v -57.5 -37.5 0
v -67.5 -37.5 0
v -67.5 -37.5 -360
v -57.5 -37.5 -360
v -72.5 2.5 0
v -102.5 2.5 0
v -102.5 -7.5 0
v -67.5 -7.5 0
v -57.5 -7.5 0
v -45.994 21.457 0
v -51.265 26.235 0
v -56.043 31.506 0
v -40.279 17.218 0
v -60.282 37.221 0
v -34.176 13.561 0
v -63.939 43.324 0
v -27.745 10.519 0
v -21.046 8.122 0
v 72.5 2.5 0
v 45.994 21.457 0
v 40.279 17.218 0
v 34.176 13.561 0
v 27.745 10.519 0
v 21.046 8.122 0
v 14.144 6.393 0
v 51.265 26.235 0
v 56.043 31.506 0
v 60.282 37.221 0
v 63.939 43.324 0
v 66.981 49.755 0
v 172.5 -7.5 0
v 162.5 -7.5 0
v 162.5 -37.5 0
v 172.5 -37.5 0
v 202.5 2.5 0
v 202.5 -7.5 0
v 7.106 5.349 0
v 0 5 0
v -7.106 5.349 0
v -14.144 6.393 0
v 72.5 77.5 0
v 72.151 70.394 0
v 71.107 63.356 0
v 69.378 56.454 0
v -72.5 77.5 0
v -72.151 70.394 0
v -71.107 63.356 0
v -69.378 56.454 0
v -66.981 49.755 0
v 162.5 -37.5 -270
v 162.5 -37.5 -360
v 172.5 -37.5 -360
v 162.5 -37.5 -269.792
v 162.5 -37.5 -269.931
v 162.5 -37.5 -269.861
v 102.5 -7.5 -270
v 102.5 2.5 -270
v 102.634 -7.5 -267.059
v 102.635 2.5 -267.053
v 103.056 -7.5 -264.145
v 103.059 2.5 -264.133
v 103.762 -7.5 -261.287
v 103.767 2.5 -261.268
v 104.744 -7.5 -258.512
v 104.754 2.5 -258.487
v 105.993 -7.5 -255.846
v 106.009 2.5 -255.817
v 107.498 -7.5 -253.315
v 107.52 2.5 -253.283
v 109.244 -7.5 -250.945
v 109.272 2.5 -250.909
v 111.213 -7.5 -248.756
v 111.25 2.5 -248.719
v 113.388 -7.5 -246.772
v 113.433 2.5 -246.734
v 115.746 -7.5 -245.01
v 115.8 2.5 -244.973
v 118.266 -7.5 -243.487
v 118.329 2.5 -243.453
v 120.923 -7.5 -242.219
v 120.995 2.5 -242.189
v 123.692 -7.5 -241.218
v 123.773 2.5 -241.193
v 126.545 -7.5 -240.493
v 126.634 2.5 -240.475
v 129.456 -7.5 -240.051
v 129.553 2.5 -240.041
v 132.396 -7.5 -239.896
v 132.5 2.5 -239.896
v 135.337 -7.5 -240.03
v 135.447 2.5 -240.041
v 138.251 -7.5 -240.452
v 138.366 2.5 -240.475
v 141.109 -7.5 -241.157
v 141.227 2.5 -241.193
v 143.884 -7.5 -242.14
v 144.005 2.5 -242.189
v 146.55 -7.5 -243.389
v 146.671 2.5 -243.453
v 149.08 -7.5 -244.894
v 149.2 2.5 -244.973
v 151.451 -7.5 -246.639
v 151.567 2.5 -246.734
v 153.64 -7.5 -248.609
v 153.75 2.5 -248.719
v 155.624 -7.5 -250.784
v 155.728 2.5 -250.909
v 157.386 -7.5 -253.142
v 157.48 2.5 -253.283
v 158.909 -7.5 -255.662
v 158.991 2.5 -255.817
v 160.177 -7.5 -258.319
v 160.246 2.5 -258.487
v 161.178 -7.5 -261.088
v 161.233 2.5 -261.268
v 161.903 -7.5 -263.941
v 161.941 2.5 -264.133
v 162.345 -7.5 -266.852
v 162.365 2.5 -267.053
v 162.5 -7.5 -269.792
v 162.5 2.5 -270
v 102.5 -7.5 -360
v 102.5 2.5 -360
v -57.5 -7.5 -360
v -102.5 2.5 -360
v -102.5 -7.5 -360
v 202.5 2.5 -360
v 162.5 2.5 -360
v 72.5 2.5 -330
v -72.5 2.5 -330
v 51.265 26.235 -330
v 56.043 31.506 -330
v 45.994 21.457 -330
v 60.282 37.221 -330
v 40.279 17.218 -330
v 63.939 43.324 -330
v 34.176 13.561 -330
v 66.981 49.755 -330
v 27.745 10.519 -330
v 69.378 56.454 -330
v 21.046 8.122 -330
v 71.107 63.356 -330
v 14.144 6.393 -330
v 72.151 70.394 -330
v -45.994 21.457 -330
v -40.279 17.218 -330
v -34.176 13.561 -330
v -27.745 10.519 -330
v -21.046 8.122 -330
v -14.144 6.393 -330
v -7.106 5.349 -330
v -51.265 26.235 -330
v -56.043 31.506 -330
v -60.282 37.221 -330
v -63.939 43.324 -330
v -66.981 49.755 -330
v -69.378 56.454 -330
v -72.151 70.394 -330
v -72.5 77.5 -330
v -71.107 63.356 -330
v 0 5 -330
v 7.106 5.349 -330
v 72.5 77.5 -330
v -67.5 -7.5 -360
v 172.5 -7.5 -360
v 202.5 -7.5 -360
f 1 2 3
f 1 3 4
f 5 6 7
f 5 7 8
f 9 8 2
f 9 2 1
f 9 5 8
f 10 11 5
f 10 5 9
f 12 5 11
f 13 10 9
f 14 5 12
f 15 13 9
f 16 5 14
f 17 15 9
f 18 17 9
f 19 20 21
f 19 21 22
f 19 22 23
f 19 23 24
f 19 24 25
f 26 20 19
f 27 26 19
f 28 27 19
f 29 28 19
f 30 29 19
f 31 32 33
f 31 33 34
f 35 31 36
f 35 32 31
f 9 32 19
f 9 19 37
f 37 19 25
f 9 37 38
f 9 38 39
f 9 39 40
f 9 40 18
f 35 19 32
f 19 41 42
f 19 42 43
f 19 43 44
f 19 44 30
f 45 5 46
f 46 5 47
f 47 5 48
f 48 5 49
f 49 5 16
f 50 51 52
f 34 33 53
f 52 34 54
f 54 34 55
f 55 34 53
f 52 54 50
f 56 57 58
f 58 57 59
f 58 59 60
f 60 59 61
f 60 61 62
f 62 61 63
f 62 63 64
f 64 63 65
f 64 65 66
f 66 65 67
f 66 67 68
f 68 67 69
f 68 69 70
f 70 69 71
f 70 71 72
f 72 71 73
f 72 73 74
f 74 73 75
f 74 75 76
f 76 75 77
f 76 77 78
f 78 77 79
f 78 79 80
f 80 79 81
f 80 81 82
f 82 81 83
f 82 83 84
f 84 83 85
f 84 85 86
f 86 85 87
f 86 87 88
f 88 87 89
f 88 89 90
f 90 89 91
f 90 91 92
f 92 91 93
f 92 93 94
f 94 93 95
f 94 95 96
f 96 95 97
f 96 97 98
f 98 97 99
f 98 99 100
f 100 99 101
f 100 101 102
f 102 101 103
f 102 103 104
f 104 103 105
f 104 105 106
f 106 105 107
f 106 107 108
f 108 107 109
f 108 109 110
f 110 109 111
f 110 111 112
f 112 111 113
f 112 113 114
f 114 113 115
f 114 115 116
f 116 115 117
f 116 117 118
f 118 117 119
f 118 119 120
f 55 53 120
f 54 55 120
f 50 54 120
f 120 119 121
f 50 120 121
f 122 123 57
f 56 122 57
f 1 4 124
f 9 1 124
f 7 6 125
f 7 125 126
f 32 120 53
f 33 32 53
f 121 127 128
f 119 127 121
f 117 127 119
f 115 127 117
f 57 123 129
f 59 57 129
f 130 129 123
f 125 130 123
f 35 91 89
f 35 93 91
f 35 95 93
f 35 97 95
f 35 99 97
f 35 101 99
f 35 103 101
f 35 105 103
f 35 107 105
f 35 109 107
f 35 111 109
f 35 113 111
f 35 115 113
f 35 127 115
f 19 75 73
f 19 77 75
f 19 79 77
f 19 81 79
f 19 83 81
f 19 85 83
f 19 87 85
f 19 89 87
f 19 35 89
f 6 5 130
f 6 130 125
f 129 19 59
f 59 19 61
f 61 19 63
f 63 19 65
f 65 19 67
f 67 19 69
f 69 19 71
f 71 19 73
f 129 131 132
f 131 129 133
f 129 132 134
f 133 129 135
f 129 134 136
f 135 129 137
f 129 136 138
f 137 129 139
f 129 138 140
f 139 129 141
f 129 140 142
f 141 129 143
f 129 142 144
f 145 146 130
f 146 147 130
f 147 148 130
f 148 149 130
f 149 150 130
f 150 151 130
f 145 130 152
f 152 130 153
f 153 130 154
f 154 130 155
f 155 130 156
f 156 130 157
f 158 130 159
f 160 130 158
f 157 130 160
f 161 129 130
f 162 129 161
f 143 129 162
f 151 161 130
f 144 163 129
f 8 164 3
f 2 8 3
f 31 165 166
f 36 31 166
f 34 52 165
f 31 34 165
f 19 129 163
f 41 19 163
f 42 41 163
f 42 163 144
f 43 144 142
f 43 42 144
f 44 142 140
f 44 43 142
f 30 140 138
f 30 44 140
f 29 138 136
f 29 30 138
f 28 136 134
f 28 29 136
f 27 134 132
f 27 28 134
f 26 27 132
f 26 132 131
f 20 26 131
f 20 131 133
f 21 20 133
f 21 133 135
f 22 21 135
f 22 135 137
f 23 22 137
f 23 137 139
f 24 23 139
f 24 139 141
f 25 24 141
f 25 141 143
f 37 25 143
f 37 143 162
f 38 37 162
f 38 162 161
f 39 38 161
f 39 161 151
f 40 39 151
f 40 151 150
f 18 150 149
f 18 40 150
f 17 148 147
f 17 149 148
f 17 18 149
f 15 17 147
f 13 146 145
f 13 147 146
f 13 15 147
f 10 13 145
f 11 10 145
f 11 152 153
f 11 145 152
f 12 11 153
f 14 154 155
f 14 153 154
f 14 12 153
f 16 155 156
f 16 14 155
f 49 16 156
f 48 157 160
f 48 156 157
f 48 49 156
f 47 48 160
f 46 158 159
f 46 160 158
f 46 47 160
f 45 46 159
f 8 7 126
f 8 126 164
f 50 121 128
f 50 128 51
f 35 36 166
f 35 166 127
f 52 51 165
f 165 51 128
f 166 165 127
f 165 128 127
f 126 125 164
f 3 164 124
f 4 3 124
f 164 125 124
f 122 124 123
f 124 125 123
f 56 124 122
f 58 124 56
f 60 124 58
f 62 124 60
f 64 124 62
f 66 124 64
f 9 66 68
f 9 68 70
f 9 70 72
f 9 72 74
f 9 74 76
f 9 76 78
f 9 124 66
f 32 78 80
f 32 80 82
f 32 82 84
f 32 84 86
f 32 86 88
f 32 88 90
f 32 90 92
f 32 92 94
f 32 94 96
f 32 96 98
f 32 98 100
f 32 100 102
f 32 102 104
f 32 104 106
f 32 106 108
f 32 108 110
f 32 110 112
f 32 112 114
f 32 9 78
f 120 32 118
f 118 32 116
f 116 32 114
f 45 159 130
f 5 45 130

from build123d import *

# Parameters (mm, degrees)
BOSS_EXTRUDE1_DEPTH = 360
CUT_EXTRUDE1_DEPTH  = 360
SKETCH4_W           = 30
SKETCH4_H           = 75
CUT_EXTRUDE2_DEPTH  = 276


with BuildPart() as part:
    # Sketch1 → Boss-Extrude1 (new body)
    with BuildSketch(Plane.XY):
        with BuildLine():
            Line((-72.5, 2.5), (-102.5, 2.5))
            Line((-102.5, 2.5), (-102.5, -7.5))
            Line((-102.5, -7.5), (-67.5, -7.5))
            Line((-67.5, -7.5), (-67.5, -37.5))
            Line((-67.5, -37.5), (-57.5, -37.5))
            Line((-57.5, -37.5), (-57.5, -7.5))
            Line((-57.5, -7.5), (57.5, -7.5))
            Line((57.5, -7.5), (67.5, -7.5))
            Line((67.5, -7.5), (162.5, -7.5))
            Line((162.5, -7.5), (162.5, -37.5))
            Line((162.5, -37.5), (172.5, -37.5))
            Line((172.5, -37.5), (172.5, -7.5))
            Line((172.5, -7.5), (202.5, -7.5))
            Line((202.5, -7.5), (202.5, 2.5))
            Line((202.5, 2.5), (72.5, 2.5))
            Line((72.5, 2.5), (72.5, 77.5))
            ThreePointArc((72.5, 77.5), (0, 5), (-72.5, 77.5))
            Line((-72.5, 77.5), (-72.5, 2.5))
        make_face()
    extrude(amount=-BOSS_EXTRUDE1_DEPTH)

    # Sketch3 → Cut-Extrude1 (cut)
    with BuildSketch(Plane(origin=(0, 2.5, 0), x_dir=(1, 0, 0), z_dir=(0, 1, 0))):
        with BuildLine():
            Line((102.5, 360), (102.5, 270))
            ThreePointArc((102.5, 270), (132.5, 239.895652489), (162.5, 270))
            Line((162.5, 270), (162.5, 360))
            Line((162.5, 360), (102.5, 360))
        make_face()
    extrude(amount=-CUT_EXTRUDE1_DEPTH, mode=Mode.SUBTRACT)

    # Sketch4 → Cut-Extrude2 (cut, through all)
    with BuildSketch(Plane.ZY.offset(72.5)):
        with Locations((-345, 40)):
            Rectangle(SKETCH4_W, SKETCH4_H)
    extrude(amount=-CUT_EXTRUDE2_DEPTH, mode=Mode.SUBTRACT)


solid = part.part
